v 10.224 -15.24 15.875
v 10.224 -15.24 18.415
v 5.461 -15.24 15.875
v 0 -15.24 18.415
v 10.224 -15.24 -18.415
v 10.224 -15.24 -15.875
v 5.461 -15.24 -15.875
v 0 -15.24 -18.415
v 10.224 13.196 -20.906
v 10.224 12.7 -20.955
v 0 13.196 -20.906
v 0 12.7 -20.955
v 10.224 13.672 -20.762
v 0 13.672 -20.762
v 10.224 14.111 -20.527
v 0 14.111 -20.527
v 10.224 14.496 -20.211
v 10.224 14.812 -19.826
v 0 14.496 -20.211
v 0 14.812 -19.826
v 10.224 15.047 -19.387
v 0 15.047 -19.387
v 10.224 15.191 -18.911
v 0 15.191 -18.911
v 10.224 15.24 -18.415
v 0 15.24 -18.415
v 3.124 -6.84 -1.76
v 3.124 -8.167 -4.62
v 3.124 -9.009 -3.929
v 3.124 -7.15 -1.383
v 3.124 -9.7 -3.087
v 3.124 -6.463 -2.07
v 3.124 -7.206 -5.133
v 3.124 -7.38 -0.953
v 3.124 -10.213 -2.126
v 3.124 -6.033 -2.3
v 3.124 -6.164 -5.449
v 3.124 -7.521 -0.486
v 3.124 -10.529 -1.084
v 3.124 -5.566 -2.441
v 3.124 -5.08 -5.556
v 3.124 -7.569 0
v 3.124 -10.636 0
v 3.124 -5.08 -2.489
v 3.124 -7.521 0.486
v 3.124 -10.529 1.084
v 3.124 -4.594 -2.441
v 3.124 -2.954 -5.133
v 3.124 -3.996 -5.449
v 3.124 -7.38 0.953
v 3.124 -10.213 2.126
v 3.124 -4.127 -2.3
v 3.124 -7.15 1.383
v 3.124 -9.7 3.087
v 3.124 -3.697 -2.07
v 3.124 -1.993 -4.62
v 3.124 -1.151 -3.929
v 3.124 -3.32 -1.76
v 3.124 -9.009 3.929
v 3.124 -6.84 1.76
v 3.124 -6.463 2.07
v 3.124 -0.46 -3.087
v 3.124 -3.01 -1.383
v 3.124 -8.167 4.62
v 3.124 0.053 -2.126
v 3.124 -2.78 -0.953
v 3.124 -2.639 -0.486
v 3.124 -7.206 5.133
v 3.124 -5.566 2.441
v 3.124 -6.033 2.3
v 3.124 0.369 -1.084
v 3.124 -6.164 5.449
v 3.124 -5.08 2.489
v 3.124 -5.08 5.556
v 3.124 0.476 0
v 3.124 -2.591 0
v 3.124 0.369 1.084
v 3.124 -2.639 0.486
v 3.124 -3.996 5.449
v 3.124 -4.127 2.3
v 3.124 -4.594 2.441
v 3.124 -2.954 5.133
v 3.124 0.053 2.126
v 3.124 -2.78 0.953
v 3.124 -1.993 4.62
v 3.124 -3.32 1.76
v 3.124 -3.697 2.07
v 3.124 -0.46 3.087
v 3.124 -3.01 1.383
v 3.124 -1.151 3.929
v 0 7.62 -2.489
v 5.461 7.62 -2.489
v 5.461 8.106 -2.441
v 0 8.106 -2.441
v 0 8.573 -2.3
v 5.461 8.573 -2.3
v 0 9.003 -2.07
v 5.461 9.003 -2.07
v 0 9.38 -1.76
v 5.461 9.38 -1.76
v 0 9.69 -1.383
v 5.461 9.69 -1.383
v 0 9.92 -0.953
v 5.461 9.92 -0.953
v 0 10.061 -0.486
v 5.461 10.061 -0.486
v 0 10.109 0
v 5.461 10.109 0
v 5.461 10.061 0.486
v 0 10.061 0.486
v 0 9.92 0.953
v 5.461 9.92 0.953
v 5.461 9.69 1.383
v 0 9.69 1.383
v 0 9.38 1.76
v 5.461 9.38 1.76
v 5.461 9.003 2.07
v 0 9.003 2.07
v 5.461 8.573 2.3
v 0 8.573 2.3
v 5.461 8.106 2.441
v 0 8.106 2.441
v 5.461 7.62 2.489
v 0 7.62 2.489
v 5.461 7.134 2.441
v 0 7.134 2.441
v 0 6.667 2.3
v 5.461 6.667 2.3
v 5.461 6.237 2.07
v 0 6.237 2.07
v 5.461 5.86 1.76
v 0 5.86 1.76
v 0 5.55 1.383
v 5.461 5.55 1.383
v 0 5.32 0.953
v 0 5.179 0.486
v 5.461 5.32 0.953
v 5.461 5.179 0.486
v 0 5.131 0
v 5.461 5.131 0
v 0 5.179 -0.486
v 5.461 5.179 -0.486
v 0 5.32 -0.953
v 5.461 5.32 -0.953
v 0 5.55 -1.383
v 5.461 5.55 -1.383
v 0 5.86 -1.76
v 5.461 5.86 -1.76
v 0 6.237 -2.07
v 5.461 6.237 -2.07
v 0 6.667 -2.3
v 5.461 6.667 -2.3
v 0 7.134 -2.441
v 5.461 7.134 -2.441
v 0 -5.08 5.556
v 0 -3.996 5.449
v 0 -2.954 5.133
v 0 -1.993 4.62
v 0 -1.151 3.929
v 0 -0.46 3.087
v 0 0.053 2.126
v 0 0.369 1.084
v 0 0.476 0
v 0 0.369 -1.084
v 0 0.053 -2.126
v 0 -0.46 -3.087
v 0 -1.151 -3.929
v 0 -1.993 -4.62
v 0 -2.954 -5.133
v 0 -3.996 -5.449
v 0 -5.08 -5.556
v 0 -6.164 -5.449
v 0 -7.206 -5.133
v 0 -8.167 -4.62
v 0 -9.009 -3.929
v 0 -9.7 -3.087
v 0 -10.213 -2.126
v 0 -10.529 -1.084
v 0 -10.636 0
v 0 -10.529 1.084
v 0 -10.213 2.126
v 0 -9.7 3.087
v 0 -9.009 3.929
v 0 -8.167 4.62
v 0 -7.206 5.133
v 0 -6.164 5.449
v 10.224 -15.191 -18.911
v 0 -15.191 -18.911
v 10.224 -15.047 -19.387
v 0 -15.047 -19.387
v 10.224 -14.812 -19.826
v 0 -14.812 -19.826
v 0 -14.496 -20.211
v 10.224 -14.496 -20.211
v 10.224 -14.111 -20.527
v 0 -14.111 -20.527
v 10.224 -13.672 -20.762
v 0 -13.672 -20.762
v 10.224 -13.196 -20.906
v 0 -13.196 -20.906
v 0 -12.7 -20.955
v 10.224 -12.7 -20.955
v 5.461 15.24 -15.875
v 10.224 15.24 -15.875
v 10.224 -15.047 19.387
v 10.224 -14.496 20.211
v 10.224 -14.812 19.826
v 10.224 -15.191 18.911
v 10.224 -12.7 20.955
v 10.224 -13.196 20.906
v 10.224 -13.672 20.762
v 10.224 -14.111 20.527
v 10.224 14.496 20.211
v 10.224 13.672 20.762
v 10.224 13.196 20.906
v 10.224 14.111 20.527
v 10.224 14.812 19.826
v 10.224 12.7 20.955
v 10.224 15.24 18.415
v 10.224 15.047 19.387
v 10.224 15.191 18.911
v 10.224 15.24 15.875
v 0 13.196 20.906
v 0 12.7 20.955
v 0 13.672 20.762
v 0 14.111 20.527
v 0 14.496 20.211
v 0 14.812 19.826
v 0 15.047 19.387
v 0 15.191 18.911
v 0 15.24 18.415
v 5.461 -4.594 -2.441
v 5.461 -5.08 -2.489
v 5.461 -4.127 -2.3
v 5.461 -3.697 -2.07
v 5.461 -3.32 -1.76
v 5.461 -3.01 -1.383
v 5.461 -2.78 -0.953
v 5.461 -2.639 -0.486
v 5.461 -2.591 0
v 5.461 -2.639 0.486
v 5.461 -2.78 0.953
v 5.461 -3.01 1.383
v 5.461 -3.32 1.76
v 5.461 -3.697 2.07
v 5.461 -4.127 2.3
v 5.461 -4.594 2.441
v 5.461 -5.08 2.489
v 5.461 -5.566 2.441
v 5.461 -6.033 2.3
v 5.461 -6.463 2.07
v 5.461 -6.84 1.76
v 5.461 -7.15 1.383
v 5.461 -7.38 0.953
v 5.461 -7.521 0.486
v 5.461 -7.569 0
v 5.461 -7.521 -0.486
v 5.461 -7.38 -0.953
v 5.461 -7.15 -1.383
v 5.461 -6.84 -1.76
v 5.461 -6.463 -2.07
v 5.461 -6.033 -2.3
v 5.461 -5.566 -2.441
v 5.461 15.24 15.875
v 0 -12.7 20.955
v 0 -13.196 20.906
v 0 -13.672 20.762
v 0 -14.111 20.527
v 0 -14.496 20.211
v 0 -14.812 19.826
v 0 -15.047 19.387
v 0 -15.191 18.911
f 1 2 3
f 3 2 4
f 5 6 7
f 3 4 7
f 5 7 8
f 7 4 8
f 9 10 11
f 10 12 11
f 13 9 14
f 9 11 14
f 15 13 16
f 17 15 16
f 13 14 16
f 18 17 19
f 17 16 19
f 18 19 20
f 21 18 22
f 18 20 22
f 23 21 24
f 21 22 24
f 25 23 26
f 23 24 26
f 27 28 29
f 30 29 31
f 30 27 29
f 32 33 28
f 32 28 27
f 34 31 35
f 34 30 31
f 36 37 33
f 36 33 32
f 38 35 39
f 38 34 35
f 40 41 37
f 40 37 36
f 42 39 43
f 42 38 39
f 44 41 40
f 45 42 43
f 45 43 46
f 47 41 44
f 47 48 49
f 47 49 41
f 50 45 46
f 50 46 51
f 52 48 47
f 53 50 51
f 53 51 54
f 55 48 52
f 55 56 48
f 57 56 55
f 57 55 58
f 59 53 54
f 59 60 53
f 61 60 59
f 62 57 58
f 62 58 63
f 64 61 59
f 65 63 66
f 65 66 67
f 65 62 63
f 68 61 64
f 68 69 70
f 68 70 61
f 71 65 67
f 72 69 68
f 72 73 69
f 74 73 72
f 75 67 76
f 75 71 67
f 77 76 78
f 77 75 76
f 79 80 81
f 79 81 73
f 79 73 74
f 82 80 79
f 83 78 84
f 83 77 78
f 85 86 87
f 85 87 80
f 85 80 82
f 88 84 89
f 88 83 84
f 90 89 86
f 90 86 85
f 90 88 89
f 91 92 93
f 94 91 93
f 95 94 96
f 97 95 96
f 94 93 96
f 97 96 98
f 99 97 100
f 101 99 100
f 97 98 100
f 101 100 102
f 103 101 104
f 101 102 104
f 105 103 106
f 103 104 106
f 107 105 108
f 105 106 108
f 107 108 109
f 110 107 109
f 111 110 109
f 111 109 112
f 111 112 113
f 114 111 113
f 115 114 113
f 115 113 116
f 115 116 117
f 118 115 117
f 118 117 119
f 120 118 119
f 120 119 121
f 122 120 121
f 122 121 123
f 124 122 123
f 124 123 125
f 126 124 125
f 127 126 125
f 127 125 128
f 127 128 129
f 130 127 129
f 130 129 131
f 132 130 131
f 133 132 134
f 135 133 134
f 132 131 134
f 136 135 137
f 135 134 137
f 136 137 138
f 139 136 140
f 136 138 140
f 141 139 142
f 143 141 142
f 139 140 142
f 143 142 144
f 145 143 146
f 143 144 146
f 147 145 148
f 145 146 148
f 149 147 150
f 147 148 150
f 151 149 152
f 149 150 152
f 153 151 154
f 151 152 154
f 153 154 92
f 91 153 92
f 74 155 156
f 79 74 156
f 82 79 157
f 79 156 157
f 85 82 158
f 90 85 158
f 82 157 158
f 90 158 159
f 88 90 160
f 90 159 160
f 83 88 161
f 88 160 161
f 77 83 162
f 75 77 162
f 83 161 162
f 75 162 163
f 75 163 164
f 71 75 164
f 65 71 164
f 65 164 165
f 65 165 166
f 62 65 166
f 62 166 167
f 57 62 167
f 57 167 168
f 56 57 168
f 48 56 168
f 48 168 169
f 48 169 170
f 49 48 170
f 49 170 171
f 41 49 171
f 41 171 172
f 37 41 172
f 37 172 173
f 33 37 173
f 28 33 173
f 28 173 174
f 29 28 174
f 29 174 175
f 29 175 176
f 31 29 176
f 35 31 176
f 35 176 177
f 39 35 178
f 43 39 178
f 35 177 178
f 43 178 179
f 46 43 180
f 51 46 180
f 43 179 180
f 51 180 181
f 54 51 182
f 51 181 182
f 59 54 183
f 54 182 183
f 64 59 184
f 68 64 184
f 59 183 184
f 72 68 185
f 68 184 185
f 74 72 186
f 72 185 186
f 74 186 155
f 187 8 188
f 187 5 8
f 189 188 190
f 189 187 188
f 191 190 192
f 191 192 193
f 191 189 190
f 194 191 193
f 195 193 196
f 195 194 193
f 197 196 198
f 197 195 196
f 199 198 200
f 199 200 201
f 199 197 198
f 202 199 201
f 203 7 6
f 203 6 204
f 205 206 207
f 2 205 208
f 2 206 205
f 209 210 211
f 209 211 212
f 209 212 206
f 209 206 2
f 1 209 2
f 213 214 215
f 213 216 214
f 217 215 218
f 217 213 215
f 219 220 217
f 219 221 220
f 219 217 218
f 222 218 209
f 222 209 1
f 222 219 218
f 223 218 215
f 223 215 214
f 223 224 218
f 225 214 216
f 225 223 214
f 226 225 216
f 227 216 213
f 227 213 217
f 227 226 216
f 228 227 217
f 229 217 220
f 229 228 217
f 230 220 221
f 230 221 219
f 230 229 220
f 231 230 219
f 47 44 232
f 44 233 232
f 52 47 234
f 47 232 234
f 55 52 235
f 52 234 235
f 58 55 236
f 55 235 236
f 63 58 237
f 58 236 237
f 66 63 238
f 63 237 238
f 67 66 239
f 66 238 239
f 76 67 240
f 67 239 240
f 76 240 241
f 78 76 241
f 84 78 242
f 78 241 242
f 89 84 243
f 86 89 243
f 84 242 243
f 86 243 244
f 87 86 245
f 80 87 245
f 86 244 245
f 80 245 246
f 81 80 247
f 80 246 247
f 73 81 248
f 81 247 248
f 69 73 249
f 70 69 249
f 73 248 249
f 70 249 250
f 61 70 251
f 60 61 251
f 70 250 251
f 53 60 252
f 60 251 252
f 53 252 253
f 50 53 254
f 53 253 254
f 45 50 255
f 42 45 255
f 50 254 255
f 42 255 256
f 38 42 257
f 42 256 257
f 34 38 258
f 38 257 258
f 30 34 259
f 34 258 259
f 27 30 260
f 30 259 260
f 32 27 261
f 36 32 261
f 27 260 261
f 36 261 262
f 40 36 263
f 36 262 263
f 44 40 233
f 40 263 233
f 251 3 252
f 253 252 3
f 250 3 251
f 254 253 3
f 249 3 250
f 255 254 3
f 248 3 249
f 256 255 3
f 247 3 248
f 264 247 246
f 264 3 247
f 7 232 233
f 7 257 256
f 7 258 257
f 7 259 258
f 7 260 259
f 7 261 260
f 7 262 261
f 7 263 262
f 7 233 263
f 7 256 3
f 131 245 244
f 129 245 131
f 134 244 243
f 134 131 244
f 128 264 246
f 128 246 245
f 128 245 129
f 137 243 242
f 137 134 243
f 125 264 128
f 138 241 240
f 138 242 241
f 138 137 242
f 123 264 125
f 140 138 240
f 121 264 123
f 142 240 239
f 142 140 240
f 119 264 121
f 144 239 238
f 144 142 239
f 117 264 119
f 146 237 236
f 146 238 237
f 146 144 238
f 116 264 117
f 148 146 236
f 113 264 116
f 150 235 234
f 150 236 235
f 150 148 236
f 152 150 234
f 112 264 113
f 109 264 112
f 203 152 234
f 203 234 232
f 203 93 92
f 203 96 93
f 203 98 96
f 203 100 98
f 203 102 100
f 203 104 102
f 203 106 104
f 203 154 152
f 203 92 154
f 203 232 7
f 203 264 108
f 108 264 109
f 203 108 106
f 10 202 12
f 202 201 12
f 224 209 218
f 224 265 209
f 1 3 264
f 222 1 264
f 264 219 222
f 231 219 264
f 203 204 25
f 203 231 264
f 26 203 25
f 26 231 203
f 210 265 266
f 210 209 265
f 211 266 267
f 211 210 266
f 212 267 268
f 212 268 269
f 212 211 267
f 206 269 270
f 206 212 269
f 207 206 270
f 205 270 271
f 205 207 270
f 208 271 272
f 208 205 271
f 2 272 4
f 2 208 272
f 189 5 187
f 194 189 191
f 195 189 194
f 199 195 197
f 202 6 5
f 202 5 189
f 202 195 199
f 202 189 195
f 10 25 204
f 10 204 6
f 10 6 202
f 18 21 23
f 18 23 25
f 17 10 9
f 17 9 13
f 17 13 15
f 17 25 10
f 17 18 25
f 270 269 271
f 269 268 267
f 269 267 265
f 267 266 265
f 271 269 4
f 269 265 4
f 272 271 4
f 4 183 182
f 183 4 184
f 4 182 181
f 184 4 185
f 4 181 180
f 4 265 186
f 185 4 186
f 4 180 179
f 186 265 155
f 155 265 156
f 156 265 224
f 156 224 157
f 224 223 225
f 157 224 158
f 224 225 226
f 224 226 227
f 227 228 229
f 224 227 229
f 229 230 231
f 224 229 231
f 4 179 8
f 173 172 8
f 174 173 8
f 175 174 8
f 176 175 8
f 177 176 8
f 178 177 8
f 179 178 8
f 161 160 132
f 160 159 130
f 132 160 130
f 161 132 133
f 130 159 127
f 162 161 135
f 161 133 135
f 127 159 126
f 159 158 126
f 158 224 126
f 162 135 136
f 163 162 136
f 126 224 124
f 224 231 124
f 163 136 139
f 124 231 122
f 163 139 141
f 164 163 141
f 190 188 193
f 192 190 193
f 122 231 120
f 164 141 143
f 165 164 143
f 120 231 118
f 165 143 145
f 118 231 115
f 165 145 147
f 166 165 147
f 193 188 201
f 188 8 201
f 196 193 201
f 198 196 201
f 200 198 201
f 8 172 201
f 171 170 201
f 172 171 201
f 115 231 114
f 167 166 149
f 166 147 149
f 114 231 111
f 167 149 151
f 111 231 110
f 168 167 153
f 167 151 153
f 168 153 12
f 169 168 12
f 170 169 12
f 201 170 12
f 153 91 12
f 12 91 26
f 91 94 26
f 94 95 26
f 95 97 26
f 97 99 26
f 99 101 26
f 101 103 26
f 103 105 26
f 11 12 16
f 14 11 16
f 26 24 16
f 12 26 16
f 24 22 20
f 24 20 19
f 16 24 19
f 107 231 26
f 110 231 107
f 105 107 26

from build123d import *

# Parameters (mm, degrees)
BOSS_EXTRUDE1_DEPTH                                 = 5.461
F_10_CLEARANCE_HOLE1_D                              = 4.9784
CBORE_FOR_10_BINDING_HEAD_MACHINE_SCREW_D           = 4.9784
CBORE_FOR_10_BINDING_HEAD_MACHINE_SCREW_CBORE_D     = 11.1125
CBORE_FOR_10_BINDING_HEAD_MACHINE_SCREW_CBORE_DEPTH = 3.1242
SKETCH10_W                                          = 5.08
SKETCH10_H                                          = 30.48
BOSS_EXTRUDE2_DEPTH                                 = 4.7625
FILLET2_R                                           = 2.54


with BuildPart() as part:
    # Sketch1 → Boss-Extrude1 (new body)
    with BuildSketch(Plane(origin=(0, 0, 0), x_dir=(0, 0, -1), z_dir=(1, 0, 0))):
        Polygon((-15.875, -15.24), (15.875, -15.24), (20.955, -15.24), (20.955, 15.24), (15.875, 15.24), (-15.875, 15.24), (-20.955, 15.24), (-20.955, -15.24), align=None)
    extrude(amount=BOSS_EXTRUDE1_DEPTH)

    # #10 Clearance Hole1 (through all)
    with Locations(Plane.ZY):
        with Locations((0, 7.62)):
            Hole(F_10_CLEARANCE_HOLE1_D / 2)

    # CBORE for #10 Binding Head Machine Screw1 (through all)
    with Locations(Plane.ZY):
        with Locations((0, -5.08)):
            CounterBoreHole(CBORE_FOR_10_BINDING_HEAD_MACHINE_SCREW_D / 2, CBORE_FOR_10_BINDING_HEAD_MACHINE_SCREW_CBORE_D / 2, CBORE_FOR_10_BINDING_HEAD_MACHINE_SCREW_CBORE_DEPTH)

    # Sketch10 → Boss-Extrude2 (add)
    with BuildSketch(Plane(origin=(5.461, 0, 0), x_dir=(0, 0, -1), z_dir=(1, 0, 0))):
        with Locations((-18.415, 0)):
            Rectangle(SKETCH10_W, SKETCH10_H)
        with Locations((18.415, 0)):
            Rectangle(SKETCH10_W, SKETCH10_H)
    extrude(amount=BOSS_EXTRUDE2_DEPTH)

    # Fillet2
    fillet2_edges = [part.edges().sort_by_distance(p)[0] for p in [
        (5.11175, 15.24, -20.955),
        (5.11175, -15.24, -20.955),
        (5.11175, -15.24, 20.955),
        (5.11175, 15.24, 20.955),
    ]]
    fillet(fillet2_edges, radius=FILLET2_R)


solid = part.part
